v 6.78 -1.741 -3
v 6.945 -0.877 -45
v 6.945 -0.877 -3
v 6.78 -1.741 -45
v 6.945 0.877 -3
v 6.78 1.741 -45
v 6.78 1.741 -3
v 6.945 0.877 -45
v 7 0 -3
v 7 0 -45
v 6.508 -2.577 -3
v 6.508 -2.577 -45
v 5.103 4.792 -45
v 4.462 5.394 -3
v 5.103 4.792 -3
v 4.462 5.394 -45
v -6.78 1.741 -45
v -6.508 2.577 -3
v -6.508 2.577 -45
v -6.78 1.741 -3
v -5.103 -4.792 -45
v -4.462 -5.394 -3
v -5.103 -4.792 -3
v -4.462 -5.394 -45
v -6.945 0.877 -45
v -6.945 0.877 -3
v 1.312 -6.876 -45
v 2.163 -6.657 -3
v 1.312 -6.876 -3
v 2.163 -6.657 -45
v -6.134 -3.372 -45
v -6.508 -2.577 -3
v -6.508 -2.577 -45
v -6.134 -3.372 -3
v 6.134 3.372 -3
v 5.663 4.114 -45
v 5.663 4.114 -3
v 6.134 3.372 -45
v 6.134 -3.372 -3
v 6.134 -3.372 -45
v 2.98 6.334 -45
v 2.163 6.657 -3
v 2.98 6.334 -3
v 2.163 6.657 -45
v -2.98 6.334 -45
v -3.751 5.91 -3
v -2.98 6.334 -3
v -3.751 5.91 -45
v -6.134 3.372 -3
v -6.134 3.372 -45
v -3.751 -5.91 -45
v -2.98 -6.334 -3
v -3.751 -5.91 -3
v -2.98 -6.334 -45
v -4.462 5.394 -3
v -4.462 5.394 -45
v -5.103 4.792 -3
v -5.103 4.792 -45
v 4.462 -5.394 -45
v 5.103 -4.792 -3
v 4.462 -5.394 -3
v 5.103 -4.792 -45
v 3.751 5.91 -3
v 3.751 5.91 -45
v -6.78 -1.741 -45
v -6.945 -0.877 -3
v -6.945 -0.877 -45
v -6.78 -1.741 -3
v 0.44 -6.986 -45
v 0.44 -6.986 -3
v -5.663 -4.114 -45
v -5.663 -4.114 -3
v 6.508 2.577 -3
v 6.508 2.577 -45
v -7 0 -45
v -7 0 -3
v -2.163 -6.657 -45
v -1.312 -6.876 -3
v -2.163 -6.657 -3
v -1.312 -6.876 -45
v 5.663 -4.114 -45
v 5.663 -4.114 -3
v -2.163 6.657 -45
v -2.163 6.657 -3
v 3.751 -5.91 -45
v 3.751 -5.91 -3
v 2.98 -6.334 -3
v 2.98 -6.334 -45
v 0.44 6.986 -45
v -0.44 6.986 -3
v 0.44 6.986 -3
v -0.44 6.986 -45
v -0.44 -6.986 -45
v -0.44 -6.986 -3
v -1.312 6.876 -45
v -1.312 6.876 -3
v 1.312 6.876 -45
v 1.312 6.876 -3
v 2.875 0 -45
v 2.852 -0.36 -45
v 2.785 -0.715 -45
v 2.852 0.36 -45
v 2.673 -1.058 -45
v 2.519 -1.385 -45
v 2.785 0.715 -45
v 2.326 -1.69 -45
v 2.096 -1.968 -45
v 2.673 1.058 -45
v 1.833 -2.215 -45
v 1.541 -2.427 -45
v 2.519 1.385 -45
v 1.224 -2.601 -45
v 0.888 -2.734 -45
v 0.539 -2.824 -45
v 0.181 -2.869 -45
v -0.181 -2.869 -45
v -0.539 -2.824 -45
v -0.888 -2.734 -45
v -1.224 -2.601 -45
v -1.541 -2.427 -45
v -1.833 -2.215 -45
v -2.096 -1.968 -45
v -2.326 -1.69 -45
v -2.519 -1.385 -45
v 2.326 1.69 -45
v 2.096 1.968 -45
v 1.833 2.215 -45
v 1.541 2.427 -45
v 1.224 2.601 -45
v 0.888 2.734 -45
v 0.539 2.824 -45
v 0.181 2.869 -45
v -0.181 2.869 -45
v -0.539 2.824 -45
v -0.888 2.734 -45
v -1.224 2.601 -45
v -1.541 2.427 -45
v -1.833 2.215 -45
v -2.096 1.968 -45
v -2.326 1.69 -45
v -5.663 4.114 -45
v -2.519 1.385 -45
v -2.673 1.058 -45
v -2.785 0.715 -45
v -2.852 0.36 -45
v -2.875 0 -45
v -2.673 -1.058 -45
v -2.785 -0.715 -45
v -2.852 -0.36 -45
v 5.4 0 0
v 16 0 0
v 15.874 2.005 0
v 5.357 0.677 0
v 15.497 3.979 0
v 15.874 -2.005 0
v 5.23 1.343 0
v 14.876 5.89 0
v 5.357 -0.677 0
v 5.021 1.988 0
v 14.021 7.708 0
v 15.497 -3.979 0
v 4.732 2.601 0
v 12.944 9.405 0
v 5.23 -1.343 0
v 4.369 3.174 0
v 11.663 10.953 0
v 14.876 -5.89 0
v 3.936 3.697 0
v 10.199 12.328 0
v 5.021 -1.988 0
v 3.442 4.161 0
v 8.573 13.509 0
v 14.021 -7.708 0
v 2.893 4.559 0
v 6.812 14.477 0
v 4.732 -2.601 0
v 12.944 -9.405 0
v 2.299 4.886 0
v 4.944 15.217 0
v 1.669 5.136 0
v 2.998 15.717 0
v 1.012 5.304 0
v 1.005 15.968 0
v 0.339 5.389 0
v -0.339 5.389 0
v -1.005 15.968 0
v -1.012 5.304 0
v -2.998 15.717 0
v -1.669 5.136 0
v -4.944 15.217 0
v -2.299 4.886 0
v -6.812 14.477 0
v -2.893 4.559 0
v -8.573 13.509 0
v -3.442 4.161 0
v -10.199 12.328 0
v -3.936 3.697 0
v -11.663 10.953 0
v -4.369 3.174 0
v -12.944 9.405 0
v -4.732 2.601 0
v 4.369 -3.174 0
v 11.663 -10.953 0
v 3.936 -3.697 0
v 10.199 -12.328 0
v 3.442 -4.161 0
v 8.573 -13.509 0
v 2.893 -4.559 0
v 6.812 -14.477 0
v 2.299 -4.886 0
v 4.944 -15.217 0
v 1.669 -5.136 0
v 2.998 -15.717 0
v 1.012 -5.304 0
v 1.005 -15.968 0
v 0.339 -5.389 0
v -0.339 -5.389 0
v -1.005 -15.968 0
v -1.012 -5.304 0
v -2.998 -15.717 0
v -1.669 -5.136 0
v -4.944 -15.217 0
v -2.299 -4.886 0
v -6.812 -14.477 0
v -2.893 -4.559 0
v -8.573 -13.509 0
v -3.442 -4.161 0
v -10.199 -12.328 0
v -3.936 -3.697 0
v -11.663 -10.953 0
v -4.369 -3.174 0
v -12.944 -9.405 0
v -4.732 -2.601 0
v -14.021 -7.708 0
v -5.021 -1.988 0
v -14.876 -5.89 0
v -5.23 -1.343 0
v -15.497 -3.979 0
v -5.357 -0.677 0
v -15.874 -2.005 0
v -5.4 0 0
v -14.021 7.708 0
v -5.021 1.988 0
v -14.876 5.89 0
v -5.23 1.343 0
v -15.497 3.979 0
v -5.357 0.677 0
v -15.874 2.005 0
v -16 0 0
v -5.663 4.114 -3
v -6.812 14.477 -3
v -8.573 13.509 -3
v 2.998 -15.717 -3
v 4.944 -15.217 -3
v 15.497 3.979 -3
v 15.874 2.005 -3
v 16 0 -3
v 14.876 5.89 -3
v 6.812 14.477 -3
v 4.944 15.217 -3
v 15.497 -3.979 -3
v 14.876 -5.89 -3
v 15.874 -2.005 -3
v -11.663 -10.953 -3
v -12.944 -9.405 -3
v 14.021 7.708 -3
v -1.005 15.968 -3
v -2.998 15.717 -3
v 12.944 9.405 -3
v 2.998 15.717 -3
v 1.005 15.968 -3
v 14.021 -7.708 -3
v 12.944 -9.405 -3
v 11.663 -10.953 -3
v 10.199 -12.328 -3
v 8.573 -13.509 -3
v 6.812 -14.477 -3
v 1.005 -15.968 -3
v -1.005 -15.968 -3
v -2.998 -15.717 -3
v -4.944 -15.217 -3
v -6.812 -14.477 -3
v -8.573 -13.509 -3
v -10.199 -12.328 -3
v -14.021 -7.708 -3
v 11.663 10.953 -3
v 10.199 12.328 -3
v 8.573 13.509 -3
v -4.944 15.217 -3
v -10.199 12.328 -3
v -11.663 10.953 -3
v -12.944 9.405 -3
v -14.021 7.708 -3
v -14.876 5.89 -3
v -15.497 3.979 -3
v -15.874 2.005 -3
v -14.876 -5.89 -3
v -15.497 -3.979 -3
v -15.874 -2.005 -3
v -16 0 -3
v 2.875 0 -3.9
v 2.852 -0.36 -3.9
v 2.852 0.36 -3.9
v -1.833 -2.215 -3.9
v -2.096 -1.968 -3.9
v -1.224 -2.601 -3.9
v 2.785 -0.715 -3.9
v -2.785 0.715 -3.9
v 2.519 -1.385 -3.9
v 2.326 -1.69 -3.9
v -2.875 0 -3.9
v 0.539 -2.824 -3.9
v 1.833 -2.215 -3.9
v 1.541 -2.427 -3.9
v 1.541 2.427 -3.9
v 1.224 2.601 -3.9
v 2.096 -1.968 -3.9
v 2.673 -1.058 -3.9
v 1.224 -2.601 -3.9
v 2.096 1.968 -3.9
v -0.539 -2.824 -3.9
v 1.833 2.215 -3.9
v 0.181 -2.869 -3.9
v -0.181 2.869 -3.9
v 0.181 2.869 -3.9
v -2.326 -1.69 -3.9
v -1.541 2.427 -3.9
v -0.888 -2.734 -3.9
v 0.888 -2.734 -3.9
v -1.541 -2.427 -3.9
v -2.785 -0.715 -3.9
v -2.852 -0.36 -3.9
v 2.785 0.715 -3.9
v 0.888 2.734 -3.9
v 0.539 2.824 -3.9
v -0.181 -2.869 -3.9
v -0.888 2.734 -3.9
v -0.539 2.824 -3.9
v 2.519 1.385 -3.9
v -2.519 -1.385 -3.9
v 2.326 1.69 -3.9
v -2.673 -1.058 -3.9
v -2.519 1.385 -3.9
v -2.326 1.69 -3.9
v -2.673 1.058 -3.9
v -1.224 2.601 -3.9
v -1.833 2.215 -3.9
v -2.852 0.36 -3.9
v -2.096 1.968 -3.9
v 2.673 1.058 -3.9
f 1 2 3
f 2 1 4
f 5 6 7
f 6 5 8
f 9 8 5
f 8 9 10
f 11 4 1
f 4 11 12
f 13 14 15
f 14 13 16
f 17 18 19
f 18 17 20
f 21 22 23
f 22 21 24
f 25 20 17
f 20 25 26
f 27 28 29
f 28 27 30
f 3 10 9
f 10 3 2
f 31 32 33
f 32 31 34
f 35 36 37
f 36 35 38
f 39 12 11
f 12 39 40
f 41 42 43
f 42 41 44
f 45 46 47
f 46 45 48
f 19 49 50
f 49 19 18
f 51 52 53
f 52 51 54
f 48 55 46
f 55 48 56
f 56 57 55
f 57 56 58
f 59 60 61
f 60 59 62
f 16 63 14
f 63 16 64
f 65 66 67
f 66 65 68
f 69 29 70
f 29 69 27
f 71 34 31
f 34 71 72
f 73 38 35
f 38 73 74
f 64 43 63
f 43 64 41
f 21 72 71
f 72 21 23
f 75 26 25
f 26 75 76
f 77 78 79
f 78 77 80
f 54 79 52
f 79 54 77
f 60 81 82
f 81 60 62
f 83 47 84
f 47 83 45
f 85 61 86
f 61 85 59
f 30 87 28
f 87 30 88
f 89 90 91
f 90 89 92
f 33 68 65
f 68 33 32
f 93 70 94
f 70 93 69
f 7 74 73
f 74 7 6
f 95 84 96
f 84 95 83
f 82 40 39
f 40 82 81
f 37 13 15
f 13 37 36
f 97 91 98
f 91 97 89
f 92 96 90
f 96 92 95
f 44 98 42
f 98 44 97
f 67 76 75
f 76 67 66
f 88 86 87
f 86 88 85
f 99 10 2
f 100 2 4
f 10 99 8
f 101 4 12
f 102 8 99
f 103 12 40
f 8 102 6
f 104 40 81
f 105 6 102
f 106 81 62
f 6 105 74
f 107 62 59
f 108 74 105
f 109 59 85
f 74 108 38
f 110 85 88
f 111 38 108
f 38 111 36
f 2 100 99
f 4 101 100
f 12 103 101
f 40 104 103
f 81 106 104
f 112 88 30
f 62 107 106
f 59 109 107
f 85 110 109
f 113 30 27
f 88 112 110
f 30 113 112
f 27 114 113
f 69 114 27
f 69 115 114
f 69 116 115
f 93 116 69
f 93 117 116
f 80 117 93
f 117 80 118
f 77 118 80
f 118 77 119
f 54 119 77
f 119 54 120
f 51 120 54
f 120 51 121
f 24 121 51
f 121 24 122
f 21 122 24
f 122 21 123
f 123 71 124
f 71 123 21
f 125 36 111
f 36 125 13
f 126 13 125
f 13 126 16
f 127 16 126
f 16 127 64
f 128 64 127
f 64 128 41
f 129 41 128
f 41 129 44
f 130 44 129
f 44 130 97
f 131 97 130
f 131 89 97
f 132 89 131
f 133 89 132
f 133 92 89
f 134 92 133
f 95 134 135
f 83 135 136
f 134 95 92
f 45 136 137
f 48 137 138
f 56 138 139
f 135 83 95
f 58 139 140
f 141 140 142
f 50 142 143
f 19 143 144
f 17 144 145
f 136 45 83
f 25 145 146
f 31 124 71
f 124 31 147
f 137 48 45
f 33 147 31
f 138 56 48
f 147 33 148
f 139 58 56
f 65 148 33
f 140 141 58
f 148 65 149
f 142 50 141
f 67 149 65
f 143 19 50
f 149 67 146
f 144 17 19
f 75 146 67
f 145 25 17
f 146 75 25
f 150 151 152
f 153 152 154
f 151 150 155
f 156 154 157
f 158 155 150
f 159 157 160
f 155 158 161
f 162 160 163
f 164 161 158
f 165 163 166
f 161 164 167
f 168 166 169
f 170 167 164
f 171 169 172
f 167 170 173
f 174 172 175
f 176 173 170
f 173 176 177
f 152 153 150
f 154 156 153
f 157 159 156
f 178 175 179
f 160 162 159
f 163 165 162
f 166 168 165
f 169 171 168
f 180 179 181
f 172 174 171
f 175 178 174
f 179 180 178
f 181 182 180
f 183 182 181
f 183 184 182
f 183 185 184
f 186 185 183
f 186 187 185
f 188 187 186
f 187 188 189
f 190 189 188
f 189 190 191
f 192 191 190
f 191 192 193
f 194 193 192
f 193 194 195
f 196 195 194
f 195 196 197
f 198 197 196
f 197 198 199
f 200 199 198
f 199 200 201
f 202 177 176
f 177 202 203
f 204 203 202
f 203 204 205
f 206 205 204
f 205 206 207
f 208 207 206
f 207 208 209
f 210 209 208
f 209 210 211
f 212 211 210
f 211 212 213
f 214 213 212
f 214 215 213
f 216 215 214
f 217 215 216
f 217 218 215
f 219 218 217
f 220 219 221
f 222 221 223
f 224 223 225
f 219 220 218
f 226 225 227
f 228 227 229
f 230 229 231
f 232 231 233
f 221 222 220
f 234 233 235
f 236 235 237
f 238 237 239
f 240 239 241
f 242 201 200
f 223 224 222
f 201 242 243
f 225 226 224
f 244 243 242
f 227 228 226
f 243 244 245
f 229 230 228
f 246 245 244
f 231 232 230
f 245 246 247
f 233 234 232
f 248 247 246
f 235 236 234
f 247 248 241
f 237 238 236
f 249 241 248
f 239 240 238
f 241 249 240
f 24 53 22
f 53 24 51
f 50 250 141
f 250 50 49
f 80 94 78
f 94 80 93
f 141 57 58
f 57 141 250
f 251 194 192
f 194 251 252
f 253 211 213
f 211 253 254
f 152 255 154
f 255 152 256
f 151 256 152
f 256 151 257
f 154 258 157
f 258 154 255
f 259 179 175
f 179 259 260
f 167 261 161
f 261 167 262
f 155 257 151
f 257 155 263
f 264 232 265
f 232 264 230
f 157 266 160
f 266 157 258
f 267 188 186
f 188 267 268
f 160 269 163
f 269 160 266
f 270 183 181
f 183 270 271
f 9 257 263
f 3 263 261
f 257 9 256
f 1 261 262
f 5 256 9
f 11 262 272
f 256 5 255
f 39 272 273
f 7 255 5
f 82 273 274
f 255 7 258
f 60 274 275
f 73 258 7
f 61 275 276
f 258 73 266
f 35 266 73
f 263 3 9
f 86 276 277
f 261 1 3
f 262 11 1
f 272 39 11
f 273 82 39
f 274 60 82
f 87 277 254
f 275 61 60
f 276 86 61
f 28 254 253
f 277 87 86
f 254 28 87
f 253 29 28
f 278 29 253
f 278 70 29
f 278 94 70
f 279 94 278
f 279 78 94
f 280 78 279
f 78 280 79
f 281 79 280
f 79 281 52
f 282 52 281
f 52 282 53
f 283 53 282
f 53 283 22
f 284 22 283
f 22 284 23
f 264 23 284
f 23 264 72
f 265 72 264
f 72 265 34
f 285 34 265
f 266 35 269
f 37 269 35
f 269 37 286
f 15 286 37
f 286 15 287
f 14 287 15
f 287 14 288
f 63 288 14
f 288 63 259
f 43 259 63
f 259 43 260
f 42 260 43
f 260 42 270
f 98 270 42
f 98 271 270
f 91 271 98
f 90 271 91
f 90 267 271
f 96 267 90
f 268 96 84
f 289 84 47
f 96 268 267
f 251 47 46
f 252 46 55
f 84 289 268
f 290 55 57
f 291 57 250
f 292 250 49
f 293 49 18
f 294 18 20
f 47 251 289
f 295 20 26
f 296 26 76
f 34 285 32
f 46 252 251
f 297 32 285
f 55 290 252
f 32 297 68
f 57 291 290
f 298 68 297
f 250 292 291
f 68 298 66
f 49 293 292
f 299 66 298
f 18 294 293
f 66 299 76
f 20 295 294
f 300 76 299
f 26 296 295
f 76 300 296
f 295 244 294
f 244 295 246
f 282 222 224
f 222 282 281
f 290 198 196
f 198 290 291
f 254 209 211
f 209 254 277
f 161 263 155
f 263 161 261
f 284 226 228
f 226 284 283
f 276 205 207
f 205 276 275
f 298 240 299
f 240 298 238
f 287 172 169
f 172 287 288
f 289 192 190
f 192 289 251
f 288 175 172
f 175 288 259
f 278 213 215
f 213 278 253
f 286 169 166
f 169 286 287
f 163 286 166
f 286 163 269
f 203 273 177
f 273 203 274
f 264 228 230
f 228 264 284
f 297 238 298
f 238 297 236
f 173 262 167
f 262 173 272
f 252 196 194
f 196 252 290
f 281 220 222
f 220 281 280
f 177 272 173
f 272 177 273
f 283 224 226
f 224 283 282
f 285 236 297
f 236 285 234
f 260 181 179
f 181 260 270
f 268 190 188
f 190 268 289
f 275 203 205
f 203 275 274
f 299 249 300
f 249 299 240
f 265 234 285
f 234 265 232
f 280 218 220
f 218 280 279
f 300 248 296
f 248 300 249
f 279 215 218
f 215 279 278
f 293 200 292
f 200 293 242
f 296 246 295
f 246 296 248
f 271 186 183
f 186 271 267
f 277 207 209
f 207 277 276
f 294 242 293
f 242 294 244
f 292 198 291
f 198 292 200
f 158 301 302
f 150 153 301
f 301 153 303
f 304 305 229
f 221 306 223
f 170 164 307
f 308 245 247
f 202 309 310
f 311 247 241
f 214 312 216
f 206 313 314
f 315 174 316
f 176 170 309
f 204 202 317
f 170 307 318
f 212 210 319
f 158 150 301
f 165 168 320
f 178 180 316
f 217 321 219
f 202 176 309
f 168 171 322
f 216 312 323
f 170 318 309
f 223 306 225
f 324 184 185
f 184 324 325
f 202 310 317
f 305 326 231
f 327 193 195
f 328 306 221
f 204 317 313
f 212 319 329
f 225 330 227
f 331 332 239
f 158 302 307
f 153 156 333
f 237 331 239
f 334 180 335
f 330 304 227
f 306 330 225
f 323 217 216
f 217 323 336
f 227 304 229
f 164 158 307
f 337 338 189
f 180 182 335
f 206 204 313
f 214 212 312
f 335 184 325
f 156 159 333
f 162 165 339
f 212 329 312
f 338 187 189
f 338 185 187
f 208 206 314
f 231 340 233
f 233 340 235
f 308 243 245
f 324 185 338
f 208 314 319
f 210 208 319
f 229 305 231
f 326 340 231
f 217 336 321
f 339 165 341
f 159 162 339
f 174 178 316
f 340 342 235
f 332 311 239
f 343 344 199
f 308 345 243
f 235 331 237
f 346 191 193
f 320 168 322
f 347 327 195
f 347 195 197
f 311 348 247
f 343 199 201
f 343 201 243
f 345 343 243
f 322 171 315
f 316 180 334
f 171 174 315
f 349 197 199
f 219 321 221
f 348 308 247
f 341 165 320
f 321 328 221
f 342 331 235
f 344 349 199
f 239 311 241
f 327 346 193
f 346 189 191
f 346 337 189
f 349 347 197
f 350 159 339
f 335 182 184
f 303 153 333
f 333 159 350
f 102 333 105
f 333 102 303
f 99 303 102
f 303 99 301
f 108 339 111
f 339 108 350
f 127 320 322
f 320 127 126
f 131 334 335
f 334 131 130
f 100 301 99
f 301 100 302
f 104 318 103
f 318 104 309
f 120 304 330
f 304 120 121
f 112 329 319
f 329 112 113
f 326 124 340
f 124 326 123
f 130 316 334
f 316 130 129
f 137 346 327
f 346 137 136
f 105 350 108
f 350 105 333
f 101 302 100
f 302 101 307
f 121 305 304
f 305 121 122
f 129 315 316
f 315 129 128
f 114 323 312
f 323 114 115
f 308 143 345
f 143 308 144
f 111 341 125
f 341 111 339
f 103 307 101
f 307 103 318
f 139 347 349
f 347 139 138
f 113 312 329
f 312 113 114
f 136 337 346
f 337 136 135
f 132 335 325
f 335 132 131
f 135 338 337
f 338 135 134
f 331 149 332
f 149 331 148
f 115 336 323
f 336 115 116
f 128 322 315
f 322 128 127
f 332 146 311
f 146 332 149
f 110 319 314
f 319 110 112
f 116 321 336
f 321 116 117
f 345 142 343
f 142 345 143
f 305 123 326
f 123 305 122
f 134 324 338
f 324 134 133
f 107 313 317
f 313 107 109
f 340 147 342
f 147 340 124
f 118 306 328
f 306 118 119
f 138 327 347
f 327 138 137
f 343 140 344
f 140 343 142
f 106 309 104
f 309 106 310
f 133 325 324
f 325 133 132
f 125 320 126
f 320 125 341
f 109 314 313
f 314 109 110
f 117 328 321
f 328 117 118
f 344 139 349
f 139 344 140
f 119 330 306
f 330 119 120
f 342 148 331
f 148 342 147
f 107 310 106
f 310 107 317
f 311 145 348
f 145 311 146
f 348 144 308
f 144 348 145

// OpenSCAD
$fn = 50;


difference() {
	union() {
		translate(v = [0, 0, -45.0000000000]) {
			cylinder(h = 45, r = 7.0000000000);
		}
		translate(v = [0, 0, -3.0000000000]) {
			cylinder(h = 3, r = 16.0000000000);
		}
	}
	union() {
		translate(v = [0, 0, 0]) {
			rotate(a = [0, 0, 0]) {
				difference() {
					union() {
						#translate(v = [0, 0, -45.0000000000]) {
							cylinder(h = 45, r = 2.6000000000);
						}
						#translate(v = [0, 0, -3.9000000000]) {
							cylinder(h = 3.9000000000, r = 7.0000000000, r1 = 2.8750000000, r2 = 5.4000000000);
						}
						#translate(v = [0, 0, -45.0000000000]) {
							cylinder(h = 45, r = 2.8750000000);
						}
						#translate(v = [0, 0, -45.0000000000]) {
							cylinder(h = 45, r = 2.6000000000);
						}
					}
					union();
				}
			}
		}
	}
}
